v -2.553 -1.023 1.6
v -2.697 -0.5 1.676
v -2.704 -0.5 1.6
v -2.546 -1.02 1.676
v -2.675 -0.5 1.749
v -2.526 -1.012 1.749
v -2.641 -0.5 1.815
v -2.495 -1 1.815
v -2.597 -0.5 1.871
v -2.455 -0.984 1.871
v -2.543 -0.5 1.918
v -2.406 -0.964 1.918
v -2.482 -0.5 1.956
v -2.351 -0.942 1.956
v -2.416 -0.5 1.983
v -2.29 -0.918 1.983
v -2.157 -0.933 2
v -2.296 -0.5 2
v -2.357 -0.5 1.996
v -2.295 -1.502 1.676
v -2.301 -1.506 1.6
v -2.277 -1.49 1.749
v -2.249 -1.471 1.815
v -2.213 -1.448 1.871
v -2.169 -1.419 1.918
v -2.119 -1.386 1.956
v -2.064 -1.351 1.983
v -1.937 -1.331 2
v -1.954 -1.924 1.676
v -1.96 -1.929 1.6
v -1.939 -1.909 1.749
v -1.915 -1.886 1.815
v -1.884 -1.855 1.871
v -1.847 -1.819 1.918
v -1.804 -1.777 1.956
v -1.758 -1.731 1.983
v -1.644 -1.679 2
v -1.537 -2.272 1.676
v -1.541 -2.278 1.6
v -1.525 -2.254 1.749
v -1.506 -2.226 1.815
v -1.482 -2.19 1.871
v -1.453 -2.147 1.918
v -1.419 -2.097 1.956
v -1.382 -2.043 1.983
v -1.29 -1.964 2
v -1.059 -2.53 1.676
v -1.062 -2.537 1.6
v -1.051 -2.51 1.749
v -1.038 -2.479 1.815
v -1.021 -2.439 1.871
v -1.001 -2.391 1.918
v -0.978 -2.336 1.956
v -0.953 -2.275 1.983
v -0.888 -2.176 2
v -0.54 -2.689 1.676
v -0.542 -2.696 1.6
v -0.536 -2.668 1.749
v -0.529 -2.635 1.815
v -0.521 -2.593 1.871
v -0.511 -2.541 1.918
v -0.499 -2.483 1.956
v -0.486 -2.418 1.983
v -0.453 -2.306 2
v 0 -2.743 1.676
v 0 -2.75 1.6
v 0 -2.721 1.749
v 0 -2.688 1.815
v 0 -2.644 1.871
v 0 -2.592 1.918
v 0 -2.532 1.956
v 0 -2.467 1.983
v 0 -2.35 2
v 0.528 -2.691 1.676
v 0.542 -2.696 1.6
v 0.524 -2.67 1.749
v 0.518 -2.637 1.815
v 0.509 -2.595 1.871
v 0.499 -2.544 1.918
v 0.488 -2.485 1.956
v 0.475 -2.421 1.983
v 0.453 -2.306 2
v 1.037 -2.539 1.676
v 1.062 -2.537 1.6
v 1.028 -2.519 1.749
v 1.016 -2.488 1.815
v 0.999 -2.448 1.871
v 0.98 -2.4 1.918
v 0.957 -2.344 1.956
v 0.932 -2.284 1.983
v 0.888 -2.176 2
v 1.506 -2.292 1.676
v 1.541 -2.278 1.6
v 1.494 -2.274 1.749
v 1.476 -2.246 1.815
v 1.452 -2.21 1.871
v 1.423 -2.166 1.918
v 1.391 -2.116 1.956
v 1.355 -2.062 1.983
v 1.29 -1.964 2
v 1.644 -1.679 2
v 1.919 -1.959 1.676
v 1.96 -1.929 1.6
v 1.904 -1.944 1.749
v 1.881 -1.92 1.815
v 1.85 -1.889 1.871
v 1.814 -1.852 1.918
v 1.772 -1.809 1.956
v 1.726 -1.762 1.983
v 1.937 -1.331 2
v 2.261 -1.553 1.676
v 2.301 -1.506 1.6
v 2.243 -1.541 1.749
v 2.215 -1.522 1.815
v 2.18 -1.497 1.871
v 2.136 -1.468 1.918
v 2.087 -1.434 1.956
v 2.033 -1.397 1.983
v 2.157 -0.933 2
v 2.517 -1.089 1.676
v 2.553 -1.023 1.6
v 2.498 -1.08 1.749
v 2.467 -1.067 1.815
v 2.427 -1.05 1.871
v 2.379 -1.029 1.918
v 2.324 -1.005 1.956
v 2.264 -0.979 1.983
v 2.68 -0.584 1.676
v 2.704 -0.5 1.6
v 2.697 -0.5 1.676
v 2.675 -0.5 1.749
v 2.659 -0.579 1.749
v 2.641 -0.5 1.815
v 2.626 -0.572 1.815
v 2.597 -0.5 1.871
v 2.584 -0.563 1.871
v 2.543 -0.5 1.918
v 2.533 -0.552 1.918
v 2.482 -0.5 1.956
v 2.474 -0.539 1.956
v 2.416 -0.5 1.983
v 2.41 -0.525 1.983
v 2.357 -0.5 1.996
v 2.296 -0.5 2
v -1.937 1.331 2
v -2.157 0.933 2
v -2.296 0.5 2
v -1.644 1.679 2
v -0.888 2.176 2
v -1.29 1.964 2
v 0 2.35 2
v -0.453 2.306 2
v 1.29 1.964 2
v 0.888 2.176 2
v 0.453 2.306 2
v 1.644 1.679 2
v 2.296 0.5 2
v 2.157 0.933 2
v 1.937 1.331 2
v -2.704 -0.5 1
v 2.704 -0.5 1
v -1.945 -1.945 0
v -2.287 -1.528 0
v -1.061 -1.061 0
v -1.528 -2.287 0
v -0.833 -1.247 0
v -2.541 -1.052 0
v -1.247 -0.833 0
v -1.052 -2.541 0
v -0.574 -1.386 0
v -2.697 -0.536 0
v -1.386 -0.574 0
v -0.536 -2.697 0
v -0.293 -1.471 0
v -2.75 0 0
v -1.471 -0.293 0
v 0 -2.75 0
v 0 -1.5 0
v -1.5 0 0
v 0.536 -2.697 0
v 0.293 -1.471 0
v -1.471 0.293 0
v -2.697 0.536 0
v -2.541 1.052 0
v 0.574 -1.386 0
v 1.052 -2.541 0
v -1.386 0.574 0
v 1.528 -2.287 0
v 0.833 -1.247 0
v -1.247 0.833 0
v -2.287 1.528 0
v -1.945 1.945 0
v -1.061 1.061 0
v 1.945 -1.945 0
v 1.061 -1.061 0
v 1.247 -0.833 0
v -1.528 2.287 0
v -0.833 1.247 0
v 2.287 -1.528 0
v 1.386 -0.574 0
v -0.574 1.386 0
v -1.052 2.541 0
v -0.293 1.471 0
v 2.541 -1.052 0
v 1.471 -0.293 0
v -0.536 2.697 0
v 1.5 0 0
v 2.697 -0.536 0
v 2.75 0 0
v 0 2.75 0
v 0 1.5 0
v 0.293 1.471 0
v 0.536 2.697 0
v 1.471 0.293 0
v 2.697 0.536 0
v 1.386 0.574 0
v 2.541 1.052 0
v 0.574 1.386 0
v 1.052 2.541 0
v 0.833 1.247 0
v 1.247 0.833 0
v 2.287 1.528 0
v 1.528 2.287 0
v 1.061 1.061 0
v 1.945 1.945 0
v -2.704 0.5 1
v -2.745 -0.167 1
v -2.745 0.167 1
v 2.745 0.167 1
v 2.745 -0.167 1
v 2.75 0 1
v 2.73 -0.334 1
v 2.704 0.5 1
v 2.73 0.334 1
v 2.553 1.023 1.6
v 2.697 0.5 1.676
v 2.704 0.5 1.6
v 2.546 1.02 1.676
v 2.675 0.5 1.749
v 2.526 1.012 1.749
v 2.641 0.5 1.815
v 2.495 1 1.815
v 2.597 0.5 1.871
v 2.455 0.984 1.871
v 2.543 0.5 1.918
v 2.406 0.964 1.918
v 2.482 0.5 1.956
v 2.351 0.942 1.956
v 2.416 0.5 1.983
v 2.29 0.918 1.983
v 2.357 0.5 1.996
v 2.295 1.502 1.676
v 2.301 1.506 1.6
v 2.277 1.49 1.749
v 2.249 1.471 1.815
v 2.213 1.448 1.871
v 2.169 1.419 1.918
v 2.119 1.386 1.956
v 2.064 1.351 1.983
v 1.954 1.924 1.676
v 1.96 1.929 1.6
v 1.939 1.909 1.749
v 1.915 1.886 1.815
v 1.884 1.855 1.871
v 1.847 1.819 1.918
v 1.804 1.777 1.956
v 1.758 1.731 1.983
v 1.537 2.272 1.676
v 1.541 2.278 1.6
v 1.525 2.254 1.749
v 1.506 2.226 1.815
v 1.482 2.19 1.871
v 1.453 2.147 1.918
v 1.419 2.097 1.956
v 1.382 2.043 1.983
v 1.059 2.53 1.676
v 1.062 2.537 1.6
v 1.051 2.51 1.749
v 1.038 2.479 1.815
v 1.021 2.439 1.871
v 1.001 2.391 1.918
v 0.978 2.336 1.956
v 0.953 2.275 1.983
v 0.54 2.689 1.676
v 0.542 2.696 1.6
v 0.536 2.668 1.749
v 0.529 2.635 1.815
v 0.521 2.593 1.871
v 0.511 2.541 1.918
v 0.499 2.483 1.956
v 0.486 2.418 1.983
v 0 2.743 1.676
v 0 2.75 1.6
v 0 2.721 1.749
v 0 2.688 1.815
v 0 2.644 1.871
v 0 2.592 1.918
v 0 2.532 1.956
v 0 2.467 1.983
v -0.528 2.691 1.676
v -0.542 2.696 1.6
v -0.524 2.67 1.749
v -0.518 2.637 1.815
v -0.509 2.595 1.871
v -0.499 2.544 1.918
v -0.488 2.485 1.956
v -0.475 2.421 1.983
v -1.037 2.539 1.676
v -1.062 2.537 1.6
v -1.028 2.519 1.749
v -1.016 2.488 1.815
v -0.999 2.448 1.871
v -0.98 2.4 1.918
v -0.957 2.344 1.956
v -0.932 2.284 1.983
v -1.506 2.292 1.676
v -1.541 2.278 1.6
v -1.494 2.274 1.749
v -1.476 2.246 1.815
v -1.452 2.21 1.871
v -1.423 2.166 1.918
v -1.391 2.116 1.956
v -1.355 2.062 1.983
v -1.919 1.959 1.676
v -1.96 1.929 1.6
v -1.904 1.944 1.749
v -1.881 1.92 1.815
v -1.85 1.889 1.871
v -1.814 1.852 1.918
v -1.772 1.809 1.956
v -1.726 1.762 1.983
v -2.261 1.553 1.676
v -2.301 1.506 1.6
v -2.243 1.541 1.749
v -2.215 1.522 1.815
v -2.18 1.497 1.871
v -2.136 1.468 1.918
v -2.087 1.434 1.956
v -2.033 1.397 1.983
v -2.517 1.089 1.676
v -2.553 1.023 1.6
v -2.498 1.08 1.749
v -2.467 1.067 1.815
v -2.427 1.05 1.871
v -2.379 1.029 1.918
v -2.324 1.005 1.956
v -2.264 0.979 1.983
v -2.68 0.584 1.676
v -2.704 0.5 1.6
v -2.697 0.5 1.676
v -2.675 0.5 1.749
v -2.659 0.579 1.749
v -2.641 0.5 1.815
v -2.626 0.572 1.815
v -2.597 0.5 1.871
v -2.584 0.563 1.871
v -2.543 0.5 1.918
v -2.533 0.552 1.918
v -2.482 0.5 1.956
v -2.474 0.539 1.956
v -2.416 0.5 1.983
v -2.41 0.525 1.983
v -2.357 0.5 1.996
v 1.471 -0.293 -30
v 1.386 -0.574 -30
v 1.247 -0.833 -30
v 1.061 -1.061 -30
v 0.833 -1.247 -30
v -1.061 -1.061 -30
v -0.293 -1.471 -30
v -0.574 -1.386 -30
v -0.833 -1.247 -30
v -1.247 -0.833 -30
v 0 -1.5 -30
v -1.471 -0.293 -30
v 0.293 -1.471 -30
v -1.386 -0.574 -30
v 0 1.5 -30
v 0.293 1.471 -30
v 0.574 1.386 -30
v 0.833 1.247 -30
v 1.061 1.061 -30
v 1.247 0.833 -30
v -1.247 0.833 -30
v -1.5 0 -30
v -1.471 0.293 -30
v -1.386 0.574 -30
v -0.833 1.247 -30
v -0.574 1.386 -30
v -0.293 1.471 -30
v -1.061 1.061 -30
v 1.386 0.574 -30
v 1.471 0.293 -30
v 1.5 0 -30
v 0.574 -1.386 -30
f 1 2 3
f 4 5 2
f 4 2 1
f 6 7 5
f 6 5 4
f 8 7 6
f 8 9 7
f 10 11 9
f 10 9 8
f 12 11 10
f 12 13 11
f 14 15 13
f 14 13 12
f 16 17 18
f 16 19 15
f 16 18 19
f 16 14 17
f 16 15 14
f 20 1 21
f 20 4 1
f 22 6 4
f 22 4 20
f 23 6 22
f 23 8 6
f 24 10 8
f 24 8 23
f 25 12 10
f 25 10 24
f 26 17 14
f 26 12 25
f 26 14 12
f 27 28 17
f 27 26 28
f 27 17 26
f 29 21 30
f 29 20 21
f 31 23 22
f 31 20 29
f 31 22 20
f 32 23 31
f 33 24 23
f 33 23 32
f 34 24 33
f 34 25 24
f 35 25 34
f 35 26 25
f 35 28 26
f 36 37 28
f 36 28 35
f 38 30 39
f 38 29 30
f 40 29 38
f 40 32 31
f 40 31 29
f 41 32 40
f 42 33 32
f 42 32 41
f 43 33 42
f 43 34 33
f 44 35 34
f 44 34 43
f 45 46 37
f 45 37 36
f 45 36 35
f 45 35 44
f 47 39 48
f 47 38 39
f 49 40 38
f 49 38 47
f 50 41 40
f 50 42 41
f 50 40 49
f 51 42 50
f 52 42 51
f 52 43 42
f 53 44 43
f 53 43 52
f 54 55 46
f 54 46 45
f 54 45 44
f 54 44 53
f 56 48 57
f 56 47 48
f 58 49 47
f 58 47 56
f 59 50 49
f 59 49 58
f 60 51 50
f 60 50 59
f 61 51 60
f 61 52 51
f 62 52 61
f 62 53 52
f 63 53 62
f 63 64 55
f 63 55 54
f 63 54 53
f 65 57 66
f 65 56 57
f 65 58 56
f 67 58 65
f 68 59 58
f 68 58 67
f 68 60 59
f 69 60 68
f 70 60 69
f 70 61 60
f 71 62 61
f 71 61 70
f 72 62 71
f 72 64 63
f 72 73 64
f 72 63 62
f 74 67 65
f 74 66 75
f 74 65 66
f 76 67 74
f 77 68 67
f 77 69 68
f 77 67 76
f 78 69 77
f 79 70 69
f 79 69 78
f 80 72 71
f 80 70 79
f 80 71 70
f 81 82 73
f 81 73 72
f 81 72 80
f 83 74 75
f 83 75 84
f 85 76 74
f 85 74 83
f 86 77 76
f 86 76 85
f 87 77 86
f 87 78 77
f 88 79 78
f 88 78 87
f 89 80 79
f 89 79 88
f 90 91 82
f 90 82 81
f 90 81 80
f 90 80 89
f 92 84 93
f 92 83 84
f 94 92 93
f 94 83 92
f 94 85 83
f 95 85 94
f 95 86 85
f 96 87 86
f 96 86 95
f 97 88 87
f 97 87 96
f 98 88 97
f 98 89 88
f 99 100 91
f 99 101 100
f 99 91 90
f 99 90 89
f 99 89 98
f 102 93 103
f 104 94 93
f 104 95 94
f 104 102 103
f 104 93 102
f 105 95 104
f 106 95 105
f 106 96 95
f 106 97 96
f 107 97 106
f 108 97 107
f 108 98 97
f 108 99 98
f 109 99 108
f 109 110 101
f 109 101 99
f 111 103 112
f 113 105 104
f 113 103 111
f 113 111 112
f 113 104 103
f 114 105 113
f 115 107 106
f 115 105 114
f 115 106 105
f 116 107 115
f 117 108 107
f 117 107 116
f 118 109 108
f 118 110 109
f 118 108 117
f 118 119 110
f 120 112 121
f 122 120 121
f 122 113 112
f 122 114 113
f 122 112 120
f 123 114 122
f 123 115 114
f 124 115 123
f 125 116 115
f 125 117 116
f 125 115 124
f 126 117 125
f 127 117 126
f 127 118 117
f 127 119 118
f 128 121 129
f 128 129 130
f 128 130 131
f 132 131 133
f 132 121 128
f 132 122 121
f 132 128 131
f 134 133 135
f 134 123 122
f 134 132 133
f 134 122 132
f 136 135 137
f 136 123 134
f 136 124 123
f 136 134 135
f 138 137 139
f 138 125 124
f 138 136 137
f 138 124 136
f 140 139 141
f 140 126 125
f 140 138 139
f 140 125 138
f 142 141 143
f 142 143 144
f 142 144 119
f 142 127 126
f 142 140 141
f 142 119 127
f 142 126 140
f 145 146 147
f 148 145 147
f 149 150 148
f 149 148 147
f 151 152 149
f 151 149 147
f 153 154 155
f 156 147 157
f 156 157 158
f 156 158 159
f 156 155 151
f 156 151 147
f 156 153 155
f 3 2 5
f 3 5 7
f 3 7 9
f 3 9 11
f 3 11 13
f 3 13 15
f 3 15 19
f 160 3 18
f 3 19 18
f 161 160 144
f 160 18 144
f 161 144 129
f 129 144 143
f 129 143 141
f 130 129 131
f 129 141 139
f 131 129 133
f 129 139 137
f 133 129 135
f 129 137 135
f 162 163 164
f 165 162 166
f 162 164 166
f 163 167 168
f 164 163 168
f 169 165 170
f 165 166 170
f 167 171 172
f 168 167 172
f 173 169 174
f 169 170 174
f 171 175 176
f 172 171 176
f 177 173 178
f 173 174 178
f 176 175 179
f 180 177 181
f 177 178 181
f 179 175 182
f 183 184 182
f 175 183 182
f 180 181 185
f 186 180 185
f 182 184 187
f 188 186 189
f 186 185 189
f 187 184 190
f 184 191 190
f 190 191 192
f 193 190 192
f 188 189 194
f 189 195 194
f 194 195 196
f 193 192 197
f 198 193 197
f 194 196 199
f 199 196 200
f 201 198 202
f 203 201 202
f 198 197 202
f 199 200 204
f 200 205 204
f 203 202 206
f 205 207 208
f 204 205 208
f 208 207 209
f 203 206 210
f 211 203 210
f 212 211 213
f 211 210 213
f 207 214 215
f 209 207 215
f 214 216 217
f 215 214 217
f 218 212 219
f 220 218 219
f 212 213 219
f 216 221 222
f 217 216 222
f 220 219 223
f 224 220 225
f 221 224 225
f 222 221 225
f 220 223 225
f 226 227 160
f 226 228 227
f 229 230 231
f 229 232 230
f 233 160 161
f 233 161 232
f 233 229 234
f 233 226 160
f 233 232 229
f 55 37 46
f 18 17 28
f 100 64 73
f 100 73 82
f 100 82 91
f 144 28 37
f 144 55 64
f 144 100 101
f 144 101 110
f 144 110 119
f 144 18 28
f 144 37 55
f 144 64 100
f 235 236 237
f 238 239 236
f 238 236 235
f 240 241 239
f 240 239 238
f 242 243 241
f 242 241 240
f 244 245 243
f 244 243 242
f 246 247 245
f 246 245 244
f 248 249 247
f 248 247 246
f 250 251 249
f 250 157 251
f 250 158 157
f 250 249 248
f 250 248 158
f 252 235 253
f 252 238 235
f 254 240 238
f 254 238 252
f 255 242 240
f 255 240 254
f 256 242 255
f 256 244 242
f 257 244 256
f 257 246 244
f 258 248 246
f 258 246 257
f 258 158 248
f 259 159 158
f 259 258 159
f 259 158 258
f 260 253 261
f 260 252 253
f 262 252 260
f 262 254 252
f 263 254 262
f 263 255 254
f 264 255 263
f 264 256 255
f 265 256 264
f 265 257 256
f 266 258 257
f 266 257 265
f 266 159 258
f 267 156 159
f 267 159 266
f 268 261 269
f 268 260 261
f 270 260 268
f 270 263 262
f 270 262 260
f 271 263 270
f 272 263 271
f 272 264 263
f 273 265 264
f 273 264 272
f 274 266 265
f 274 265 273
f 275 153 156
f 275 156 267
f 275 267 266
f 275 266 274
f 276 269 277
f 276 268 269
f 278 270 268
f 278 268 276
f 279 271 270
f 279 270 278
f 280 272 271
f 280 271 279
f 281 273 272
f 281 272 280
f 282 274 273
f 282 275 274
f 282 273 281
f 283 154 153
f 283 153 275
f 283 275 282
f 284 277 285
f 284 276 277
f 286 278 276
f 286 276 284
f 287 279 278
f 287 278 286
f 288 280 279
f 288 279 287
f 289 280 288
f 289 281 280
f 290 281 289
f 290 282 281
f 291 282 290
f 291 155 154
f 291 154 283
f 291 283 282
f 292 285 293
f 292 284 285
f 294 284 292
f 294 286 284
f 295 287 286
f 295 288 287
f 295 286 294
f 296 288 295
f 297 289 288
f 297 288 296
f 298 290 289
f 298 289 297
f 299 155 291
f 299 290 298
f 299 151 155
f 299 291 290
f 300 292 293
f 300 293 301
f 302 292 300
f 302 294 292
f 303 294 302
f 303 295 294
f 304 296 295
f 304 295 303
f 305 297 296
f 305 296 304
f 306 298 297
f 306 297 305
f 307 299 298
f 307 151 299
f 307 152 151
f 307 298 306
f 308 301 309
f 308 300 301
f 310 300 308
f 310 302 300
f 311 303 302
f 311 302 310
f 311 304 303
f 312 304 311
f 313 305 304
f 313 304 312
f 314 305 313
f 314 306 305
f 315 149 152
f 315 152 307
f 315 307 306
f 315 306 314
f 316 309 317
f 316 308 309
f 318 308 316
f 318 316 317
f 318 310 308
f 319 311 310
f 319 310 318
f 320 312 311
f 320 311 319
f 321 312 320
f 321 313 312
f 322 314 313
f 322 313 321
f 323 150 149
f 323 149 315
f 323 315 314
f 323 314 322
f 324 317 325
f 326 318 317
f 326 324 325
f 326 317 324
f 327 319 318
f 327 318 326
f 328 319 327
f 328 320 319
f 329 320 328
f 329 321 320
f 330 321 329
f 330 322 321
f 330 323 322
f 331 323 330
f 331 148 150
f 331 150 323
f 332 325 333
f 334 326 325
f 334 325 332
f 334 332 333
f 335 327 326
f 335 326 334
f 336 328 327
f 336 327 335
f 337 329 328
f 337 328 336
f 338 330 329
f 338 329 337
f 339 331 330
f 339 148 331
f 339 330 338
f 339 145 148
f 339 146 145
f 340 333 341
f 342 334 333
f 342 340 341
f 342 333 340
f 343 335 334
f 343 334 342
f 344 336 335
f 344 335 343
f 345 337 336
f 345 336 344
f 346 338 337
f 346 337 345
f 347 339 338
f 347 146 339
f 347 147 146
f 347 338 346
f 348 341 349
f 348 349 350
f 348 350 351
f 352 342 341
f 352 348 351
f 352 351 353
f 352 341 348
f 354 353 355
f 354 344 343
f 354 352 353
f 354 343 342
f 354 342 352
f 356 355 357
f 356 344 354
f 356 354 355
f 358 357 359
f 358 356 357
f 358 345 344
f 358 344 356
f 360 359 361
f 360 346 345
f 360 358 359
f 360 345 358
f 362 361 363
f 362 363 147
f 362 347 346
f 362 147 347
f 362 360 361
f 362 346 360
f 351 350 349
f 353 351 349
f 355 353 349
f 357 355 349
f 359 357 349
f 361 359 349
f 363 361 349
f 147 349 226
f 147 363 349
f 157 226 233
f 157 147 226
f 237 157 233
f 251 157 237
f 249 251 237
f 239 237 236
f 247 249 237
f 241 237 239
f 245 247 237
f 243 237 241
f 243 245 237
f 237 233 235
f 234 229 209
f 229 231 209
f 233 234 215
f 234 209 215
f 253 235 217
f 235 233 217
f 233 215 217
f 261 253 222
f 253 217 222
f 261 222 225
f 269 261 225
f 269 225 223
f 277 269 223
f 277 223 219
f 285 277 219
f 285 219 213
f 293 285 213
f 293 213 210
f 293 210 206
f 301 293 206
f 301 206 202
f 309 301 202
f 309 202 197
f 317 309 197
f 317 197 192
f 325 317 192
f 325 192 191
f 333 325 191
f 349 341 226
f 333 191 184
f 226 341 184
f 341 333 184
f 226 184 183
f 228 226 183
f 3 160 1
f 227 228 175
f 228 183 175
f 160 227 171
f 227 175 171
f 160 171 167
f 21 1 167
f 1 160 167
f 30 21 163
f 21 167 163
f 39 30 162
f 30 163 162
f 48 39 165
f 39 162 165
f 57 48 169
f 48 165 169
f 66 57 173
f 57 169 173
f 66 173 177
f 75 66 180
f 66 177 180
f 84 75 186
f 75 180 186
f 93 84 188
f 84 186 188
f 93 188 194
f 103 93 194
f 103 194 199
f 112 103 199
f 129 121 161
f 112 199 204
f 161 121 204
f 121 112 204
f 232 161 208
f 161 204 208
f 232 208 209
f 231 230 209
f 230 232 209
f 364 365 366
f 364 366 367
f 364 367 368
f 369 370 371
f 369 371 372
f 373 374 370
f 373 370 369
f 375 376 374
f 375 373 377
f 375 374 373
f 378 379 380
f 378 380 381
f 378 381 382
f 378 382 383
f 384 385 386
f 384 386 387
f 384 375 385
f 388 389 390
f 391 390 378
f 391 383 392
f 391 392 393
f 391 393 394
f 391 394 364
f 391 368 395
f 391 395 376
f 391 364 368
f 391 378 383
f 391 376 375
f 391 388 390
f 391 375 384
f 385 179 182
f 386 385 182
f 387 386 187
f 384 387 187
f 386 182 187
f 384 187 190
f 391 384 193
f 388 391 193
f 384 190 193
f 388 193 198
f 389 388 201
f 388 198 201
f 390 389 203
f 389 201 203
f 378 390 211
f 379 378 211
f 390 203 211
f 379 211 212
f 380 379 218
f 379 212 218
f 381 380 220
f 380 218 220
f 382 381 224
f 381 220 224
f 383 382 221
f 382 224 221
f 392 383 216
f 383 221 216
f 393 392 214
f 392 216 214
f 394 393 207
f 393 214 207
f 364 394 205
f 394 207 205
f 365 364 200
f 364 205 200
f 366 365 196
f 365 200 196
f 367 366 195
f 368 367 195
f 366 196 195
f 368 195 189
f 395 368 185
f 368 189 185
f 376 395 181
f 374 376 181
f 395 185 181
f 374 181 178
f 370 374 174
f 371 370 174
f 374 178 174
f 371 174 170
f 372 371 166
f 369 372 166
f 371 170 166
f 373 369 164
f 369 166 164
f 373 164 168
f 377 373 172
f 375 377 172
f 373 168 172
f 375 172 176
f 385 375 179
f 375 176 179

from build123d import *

# Parameters (mm, degrees)
SKETCH1_R           = 2.75
BOSS_EXTRUDE1_DEPTH = 2
FILLET1_R           = 0.4
SKETCH2_W           = 7.85101285
SKETCH2_H           = 1
CUT_EXTRUDE1_DEPTH  = 1
SKETCH3_R           = 1.5
BOSS_EXTRUDE2_DEPTH = 30


with BuildPart() as part:
    # Sketch1 → Boss-Extrude1 (new body)
    with BuildSketch(Plane.XY):
        Circle(SKETCH1_R)
    extrude(amount=BOSS_EXTRUDE1_DEPTH)

    # Fillet1
    fillet1_edges = [part.edges().sort_by_distance(p)[0] for p in [
        (-2.75, 0, 2),
    ]]
    fillet(fillet1_edges, radius=FILLET1_R)

    # Sketch2 → Cut-Extrude1 (cut)
    with BuildSketch(Plane.XY.offset(2)):
        Rectangle(SKETCH2_W, SKETCH2_H)
    extrude(amount=-CUT_EXTRUDE1_DEPTH, mode=Mode.SUBTRACT)

    # Sketch3 → Boss-Extrude2 (add)
    with BuildSketch(Plane(origin=(0, 0, 0), x_dir=(-1, 0, 0), z_dir=(0, 0, -1))):
        Circle(SKETCH3_R)
    extrude(amount=BOSS_EXTRUDE2_DEPTH)


solid = part.part
